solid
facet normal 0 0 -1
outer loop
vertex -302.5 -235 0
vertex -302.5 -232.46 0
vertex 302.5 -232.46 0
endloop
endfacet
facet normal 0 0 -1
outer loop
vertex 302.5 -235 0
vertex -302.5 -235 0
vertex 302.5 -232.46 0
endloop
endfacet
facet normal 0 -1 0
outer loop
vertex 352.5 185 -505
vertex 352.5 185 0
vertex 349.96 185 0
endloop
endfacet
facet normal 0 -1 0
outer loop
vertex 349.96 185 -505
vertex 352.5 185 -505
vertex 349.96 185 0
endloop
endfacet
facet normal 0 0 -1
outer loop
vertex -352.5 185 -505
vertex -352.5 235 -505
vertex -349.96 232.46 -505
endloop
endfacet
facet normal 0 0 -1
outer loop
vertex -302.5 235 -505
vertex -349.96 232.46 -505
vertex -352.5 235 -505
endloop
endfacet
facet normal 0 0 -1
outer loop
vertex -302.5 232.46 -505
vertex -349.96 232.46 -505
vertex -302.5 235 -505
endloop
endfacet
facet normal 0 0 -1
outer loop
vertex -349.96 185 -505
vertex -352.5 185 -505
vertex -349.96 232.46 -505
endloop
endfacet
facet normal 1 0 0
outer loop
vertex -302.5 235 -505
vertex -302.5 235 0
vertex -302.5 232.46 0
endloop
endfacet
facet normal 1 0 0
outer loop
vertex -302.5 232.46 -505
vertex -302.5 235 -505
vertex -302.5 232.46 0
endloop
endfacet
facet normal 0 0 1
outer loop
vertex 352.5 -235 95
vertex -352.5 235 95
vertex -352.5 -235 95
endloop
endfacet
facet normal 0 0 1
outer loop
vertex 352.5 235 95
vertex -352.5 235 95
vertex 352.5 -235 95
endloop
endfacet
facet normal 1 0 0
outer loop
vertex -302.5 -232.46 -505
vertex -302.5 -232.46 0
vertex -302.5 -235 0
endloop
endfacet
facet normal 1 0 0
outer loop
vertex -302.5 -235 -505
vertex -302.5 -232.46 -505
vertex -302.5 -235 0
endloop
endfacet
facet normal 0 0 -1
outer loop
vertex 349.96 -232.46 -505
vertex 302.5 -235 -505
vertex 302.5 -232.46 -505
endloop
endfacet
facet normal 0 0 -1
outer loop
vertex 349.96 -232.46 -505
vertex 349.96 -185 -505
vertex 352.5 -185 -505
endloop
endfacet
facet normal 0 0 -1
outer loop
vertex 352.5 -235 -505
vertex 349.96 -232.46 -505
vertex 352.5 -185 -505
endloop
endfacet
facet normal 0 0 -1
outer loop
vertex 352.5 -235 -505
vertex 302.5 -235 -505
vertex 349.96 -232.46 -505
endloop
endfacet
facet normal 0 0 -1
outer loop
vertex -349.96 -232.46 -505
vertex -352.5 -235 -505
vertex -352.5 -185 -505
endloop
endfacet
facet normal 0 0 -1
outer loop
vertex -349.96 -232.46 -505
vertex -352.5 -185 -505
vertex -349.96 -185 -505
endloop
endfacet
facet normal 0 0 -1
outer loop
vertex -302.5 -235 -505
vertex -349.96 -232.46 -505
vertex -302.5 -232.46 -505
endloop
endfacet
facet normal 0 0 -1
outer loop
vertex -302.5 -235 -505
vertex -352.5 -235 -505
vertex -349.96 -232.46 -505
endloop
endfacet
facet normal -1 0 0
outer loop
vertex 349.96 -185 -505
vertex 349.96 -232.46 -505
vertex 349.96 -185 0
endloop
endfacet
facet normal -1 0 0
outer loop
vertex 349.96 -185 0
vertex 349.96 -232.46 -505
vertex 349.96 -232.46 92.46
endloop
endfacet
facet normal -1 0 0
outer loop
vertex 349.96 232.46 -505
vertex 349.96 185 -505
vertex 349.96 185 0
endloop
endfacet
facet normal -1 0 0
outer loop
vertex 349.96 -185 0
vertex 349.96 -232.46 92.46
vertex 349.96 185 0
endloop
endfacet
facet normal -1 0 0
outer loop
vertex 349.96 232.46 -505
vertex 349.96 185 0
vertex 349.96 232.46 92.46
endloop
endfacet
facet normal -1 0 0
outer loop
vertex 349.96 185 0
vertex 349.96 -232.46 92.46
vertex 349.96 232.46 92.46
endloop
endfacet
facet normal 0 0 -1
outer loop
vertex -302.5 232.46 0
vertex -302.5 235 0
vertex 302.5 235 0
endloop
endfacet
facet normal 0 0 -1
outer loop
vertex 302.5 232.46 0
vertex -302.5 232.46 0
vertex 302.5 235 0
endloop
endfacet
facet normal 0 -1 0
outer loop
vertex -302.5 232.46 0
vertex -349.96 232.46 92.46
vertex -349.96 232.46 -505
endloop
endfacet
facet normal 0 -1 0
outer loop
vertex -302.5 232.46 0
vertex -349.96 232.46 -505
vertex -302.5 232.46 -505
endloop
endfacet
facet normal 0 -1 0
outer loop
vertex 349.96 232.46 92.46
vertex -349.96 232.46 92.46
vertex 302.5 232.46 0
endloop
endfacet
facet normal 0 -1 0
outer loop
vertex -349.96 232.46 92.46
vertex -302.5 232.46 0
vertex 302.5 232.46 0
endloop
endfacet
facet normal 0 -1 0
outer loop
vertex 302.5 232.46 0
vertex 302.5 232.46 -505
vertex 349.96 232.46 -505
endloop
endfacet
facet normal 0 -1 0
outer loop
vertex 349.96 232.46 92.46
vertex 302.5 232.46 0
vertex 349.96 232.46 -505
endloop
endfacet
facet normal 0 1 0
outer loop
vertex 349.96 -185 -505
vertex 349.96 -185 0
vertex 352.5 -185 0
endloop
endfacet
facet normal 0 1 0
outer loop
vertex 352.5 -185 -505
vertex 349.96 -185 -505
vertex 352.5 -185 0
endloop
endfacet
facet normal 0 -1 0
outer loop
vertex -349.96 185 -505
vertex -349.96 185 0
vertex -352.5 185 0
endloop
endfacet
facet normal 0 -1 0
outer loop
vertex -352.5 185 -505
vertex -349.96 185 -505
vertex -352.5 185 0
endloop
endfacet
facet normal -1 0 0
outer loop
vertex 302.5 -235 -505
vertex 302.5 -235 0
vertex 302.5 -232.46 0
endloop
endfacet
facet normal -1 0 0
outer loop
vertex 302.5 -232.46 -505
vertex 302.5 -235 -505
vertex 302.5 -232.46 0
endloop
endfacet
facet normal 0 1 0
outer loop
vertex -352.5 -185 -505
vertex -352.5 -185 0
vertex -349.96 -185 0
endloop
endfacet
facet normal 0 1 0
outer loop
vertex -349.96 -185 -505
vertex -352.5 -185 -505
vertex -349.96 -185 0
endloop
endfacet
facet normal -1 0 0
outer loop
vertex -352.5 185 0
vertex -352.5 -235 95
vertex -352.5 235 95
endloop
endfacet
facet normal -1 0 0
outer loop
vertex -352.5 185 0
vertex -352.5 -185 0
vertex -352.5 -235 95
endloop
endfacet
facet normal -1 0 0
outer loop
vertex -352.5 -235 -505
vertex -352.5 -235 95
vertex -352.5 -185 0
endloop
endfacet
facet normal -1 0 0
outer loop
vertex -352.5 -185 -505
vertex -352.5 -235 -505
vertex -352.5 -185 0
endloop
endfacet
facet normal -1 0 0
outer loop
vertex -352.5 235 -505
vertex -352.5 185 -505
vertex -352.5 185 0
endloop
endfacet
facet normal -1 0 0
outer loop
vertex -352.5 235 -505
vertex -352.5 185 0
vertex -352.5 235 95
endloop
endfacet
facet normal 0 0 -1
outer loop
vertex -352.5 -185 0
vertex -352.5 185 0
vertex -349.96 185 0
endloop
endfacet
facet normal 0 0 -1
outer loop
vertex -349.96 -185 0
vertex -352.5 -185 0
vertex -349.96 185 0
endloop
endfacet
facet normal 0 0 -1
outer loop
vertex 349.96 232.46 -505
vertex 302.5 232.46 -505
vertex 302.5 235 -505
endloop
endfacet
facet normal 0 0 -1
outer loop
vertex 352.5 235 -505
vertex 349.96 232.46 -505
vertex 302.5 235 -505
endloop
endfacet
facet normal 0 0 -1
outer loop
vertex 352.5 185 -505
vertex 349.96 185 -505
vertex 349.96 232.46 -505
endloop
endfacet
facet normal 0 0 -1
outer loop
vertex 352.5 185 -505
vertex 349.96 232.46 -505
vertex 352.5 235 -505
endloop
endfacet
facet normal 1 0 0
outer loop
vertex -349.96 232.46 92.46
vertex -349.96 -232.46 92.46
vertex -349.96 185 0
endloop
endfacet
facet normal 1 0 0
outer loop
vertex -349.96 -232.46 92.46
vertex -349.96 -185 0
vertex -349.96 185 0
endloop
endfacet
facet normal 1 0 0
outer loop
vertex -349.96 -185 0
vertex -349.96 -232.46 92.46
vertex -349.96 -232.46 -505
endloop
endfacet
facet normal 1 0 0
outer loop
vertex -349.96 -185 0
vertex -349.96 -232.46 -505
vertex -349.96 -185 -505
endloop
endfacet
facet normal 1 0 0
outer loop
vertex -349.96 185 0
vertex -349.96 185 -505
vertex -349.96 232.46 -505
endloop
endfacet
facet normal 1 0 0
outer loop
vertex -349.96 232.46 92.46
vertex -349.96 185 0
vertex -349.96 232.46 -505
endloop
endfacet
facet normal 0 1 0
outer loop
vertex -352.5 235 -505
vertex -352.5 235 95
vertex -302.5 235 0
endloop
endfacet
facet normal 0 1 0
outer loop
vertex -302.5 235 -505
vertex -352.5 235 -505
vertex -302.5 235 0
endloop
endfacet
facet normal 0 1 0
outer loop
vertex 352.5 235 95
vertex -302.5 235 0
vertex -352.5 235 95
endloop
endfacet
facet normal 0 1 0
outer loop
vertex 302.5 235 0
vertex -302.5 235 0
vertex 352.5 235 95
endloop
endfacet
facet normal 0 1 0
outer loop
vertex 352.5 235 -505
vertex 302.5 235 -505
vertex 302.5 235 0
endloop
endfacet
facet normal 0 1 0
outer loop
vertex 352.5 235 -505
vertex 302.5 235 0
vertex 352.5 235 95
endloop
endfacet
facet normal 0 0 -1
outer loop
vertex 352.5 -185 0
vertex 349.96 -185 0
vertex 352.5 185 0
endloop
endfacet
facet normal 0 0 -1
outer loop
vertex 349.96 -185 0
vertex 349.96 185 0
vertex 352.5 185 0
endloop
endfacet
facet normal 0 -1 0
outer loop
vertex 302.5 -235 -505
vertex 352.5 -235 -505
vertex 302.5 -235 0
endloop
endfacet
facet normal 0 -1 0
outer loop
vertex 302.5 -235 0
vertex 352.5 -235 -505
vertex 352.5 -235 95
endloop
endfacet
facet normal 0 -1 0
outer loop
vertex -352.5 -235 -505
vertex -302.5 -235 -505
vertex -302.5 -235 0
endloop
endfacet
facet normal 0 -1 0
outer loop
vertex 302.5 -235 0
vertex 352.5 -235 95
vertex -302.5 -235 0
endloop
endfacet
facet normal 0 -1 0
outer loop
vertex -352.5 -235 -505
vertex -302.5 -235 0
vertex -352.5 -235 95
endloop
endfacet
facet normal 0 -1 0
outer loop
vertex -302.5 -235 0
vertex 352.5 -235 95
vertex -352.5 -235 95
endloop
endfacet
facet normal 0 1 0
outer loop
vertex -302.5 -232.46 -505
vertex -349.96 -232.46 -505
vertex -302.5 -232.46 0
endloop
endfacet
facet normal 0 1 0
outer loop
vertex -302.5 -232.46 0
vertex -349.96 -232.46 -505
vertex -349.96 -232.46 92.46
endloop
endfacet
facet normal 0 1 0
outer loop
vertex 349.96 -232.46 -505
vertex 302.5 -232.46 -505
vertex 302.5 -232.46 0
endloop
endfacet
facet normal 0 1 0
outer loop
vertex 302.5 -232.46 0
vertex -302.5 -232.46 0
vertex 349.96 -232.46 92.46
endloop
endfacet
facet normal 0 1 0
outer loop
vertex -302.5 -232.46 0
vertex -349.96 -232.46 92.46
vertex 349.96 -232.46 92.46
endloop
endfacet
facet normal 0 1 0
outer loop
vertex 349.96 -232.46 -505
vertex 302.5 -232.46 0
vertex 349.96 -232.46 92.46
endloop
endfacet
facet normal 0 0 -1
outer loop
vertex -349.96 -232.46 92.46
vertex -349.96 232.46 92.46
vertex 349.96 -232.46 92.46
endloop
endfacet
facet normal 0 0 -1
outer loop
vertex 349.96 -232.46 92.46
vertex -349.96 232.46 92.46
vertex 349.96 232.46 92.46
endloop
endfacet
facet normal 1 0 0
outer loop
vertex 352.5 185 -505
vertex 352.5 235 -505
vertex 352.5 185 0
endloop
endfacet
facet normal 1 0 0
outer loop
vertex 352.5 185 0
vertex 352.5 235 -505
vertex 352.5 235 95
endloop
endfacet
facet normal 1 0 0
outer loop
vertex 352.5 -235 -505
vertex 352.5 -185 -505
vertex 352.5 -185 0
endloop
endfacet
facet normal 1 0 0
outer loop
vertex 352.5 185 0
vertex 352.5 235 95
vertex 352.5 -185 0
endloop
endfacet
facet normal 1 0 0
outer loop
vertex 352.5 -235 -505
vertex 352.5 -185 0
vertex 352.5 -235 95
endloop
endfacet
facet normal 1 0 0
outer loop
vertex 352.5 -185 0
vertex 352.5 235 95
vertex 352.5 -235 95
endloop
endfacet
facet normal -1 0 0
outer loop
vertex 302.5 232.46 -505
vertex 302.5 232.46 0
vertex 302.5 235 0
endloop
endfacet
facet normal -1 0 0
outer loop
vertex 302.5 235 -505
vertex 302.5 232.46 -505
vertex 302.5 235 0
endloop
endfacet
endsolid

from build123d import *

# Parameters (mm, degrees)
F0_W     = 705
F0_H     = 470
F1_DEPTH = 95
F2_T     = -2.54
F4_DEPTH = 505


with BuildPart() as f1:
    # F0 (on Top) → F1 (new body)
    with BuildSketch(Plane.XY):
        Rectangle(F0_W, F0_H)
    extrude(amount=F1_DEPTH)

    # F2
    f2_openings = [f1.faces().sort_by_distance(p)[0] for p in [
        (0, 0, 0),
    ]]
    offset(amount=F2_T, openings=f2_openings)

    # F3 (on face) → F4 (join)
    with BuildSketch(Plane(origin=(0, 0, 0), x_dir=(1, 0, 0), z_dir=(0, 0, -1))):
        Polygon((352.5, 235), (302.5, 235), (302.5, 232.46), (349.96, 232.46), (349.96, 185), (352.5, 185), align=None)
        Polygon((-352.5, 235), (-352.5, 185), (-349.96, 185), (-349.96, 232.46), (-302.5, 232.46), (-302.5, 235), align=None)
        Polygon((-352.5, -185), (-352.5, -235), (-302.5, -235), (-302.5, -232.46), (-349.96, -232.46), (-349.96, -185), align=None)
        Polygon((302.5, -232.46), (302.5, -235), (352.5, -235), (352.5, -185), (349.96, -185), (349.96, -232.46), align=None)
    extrude(amount=F4_DEPTH)


solid = f1.part
